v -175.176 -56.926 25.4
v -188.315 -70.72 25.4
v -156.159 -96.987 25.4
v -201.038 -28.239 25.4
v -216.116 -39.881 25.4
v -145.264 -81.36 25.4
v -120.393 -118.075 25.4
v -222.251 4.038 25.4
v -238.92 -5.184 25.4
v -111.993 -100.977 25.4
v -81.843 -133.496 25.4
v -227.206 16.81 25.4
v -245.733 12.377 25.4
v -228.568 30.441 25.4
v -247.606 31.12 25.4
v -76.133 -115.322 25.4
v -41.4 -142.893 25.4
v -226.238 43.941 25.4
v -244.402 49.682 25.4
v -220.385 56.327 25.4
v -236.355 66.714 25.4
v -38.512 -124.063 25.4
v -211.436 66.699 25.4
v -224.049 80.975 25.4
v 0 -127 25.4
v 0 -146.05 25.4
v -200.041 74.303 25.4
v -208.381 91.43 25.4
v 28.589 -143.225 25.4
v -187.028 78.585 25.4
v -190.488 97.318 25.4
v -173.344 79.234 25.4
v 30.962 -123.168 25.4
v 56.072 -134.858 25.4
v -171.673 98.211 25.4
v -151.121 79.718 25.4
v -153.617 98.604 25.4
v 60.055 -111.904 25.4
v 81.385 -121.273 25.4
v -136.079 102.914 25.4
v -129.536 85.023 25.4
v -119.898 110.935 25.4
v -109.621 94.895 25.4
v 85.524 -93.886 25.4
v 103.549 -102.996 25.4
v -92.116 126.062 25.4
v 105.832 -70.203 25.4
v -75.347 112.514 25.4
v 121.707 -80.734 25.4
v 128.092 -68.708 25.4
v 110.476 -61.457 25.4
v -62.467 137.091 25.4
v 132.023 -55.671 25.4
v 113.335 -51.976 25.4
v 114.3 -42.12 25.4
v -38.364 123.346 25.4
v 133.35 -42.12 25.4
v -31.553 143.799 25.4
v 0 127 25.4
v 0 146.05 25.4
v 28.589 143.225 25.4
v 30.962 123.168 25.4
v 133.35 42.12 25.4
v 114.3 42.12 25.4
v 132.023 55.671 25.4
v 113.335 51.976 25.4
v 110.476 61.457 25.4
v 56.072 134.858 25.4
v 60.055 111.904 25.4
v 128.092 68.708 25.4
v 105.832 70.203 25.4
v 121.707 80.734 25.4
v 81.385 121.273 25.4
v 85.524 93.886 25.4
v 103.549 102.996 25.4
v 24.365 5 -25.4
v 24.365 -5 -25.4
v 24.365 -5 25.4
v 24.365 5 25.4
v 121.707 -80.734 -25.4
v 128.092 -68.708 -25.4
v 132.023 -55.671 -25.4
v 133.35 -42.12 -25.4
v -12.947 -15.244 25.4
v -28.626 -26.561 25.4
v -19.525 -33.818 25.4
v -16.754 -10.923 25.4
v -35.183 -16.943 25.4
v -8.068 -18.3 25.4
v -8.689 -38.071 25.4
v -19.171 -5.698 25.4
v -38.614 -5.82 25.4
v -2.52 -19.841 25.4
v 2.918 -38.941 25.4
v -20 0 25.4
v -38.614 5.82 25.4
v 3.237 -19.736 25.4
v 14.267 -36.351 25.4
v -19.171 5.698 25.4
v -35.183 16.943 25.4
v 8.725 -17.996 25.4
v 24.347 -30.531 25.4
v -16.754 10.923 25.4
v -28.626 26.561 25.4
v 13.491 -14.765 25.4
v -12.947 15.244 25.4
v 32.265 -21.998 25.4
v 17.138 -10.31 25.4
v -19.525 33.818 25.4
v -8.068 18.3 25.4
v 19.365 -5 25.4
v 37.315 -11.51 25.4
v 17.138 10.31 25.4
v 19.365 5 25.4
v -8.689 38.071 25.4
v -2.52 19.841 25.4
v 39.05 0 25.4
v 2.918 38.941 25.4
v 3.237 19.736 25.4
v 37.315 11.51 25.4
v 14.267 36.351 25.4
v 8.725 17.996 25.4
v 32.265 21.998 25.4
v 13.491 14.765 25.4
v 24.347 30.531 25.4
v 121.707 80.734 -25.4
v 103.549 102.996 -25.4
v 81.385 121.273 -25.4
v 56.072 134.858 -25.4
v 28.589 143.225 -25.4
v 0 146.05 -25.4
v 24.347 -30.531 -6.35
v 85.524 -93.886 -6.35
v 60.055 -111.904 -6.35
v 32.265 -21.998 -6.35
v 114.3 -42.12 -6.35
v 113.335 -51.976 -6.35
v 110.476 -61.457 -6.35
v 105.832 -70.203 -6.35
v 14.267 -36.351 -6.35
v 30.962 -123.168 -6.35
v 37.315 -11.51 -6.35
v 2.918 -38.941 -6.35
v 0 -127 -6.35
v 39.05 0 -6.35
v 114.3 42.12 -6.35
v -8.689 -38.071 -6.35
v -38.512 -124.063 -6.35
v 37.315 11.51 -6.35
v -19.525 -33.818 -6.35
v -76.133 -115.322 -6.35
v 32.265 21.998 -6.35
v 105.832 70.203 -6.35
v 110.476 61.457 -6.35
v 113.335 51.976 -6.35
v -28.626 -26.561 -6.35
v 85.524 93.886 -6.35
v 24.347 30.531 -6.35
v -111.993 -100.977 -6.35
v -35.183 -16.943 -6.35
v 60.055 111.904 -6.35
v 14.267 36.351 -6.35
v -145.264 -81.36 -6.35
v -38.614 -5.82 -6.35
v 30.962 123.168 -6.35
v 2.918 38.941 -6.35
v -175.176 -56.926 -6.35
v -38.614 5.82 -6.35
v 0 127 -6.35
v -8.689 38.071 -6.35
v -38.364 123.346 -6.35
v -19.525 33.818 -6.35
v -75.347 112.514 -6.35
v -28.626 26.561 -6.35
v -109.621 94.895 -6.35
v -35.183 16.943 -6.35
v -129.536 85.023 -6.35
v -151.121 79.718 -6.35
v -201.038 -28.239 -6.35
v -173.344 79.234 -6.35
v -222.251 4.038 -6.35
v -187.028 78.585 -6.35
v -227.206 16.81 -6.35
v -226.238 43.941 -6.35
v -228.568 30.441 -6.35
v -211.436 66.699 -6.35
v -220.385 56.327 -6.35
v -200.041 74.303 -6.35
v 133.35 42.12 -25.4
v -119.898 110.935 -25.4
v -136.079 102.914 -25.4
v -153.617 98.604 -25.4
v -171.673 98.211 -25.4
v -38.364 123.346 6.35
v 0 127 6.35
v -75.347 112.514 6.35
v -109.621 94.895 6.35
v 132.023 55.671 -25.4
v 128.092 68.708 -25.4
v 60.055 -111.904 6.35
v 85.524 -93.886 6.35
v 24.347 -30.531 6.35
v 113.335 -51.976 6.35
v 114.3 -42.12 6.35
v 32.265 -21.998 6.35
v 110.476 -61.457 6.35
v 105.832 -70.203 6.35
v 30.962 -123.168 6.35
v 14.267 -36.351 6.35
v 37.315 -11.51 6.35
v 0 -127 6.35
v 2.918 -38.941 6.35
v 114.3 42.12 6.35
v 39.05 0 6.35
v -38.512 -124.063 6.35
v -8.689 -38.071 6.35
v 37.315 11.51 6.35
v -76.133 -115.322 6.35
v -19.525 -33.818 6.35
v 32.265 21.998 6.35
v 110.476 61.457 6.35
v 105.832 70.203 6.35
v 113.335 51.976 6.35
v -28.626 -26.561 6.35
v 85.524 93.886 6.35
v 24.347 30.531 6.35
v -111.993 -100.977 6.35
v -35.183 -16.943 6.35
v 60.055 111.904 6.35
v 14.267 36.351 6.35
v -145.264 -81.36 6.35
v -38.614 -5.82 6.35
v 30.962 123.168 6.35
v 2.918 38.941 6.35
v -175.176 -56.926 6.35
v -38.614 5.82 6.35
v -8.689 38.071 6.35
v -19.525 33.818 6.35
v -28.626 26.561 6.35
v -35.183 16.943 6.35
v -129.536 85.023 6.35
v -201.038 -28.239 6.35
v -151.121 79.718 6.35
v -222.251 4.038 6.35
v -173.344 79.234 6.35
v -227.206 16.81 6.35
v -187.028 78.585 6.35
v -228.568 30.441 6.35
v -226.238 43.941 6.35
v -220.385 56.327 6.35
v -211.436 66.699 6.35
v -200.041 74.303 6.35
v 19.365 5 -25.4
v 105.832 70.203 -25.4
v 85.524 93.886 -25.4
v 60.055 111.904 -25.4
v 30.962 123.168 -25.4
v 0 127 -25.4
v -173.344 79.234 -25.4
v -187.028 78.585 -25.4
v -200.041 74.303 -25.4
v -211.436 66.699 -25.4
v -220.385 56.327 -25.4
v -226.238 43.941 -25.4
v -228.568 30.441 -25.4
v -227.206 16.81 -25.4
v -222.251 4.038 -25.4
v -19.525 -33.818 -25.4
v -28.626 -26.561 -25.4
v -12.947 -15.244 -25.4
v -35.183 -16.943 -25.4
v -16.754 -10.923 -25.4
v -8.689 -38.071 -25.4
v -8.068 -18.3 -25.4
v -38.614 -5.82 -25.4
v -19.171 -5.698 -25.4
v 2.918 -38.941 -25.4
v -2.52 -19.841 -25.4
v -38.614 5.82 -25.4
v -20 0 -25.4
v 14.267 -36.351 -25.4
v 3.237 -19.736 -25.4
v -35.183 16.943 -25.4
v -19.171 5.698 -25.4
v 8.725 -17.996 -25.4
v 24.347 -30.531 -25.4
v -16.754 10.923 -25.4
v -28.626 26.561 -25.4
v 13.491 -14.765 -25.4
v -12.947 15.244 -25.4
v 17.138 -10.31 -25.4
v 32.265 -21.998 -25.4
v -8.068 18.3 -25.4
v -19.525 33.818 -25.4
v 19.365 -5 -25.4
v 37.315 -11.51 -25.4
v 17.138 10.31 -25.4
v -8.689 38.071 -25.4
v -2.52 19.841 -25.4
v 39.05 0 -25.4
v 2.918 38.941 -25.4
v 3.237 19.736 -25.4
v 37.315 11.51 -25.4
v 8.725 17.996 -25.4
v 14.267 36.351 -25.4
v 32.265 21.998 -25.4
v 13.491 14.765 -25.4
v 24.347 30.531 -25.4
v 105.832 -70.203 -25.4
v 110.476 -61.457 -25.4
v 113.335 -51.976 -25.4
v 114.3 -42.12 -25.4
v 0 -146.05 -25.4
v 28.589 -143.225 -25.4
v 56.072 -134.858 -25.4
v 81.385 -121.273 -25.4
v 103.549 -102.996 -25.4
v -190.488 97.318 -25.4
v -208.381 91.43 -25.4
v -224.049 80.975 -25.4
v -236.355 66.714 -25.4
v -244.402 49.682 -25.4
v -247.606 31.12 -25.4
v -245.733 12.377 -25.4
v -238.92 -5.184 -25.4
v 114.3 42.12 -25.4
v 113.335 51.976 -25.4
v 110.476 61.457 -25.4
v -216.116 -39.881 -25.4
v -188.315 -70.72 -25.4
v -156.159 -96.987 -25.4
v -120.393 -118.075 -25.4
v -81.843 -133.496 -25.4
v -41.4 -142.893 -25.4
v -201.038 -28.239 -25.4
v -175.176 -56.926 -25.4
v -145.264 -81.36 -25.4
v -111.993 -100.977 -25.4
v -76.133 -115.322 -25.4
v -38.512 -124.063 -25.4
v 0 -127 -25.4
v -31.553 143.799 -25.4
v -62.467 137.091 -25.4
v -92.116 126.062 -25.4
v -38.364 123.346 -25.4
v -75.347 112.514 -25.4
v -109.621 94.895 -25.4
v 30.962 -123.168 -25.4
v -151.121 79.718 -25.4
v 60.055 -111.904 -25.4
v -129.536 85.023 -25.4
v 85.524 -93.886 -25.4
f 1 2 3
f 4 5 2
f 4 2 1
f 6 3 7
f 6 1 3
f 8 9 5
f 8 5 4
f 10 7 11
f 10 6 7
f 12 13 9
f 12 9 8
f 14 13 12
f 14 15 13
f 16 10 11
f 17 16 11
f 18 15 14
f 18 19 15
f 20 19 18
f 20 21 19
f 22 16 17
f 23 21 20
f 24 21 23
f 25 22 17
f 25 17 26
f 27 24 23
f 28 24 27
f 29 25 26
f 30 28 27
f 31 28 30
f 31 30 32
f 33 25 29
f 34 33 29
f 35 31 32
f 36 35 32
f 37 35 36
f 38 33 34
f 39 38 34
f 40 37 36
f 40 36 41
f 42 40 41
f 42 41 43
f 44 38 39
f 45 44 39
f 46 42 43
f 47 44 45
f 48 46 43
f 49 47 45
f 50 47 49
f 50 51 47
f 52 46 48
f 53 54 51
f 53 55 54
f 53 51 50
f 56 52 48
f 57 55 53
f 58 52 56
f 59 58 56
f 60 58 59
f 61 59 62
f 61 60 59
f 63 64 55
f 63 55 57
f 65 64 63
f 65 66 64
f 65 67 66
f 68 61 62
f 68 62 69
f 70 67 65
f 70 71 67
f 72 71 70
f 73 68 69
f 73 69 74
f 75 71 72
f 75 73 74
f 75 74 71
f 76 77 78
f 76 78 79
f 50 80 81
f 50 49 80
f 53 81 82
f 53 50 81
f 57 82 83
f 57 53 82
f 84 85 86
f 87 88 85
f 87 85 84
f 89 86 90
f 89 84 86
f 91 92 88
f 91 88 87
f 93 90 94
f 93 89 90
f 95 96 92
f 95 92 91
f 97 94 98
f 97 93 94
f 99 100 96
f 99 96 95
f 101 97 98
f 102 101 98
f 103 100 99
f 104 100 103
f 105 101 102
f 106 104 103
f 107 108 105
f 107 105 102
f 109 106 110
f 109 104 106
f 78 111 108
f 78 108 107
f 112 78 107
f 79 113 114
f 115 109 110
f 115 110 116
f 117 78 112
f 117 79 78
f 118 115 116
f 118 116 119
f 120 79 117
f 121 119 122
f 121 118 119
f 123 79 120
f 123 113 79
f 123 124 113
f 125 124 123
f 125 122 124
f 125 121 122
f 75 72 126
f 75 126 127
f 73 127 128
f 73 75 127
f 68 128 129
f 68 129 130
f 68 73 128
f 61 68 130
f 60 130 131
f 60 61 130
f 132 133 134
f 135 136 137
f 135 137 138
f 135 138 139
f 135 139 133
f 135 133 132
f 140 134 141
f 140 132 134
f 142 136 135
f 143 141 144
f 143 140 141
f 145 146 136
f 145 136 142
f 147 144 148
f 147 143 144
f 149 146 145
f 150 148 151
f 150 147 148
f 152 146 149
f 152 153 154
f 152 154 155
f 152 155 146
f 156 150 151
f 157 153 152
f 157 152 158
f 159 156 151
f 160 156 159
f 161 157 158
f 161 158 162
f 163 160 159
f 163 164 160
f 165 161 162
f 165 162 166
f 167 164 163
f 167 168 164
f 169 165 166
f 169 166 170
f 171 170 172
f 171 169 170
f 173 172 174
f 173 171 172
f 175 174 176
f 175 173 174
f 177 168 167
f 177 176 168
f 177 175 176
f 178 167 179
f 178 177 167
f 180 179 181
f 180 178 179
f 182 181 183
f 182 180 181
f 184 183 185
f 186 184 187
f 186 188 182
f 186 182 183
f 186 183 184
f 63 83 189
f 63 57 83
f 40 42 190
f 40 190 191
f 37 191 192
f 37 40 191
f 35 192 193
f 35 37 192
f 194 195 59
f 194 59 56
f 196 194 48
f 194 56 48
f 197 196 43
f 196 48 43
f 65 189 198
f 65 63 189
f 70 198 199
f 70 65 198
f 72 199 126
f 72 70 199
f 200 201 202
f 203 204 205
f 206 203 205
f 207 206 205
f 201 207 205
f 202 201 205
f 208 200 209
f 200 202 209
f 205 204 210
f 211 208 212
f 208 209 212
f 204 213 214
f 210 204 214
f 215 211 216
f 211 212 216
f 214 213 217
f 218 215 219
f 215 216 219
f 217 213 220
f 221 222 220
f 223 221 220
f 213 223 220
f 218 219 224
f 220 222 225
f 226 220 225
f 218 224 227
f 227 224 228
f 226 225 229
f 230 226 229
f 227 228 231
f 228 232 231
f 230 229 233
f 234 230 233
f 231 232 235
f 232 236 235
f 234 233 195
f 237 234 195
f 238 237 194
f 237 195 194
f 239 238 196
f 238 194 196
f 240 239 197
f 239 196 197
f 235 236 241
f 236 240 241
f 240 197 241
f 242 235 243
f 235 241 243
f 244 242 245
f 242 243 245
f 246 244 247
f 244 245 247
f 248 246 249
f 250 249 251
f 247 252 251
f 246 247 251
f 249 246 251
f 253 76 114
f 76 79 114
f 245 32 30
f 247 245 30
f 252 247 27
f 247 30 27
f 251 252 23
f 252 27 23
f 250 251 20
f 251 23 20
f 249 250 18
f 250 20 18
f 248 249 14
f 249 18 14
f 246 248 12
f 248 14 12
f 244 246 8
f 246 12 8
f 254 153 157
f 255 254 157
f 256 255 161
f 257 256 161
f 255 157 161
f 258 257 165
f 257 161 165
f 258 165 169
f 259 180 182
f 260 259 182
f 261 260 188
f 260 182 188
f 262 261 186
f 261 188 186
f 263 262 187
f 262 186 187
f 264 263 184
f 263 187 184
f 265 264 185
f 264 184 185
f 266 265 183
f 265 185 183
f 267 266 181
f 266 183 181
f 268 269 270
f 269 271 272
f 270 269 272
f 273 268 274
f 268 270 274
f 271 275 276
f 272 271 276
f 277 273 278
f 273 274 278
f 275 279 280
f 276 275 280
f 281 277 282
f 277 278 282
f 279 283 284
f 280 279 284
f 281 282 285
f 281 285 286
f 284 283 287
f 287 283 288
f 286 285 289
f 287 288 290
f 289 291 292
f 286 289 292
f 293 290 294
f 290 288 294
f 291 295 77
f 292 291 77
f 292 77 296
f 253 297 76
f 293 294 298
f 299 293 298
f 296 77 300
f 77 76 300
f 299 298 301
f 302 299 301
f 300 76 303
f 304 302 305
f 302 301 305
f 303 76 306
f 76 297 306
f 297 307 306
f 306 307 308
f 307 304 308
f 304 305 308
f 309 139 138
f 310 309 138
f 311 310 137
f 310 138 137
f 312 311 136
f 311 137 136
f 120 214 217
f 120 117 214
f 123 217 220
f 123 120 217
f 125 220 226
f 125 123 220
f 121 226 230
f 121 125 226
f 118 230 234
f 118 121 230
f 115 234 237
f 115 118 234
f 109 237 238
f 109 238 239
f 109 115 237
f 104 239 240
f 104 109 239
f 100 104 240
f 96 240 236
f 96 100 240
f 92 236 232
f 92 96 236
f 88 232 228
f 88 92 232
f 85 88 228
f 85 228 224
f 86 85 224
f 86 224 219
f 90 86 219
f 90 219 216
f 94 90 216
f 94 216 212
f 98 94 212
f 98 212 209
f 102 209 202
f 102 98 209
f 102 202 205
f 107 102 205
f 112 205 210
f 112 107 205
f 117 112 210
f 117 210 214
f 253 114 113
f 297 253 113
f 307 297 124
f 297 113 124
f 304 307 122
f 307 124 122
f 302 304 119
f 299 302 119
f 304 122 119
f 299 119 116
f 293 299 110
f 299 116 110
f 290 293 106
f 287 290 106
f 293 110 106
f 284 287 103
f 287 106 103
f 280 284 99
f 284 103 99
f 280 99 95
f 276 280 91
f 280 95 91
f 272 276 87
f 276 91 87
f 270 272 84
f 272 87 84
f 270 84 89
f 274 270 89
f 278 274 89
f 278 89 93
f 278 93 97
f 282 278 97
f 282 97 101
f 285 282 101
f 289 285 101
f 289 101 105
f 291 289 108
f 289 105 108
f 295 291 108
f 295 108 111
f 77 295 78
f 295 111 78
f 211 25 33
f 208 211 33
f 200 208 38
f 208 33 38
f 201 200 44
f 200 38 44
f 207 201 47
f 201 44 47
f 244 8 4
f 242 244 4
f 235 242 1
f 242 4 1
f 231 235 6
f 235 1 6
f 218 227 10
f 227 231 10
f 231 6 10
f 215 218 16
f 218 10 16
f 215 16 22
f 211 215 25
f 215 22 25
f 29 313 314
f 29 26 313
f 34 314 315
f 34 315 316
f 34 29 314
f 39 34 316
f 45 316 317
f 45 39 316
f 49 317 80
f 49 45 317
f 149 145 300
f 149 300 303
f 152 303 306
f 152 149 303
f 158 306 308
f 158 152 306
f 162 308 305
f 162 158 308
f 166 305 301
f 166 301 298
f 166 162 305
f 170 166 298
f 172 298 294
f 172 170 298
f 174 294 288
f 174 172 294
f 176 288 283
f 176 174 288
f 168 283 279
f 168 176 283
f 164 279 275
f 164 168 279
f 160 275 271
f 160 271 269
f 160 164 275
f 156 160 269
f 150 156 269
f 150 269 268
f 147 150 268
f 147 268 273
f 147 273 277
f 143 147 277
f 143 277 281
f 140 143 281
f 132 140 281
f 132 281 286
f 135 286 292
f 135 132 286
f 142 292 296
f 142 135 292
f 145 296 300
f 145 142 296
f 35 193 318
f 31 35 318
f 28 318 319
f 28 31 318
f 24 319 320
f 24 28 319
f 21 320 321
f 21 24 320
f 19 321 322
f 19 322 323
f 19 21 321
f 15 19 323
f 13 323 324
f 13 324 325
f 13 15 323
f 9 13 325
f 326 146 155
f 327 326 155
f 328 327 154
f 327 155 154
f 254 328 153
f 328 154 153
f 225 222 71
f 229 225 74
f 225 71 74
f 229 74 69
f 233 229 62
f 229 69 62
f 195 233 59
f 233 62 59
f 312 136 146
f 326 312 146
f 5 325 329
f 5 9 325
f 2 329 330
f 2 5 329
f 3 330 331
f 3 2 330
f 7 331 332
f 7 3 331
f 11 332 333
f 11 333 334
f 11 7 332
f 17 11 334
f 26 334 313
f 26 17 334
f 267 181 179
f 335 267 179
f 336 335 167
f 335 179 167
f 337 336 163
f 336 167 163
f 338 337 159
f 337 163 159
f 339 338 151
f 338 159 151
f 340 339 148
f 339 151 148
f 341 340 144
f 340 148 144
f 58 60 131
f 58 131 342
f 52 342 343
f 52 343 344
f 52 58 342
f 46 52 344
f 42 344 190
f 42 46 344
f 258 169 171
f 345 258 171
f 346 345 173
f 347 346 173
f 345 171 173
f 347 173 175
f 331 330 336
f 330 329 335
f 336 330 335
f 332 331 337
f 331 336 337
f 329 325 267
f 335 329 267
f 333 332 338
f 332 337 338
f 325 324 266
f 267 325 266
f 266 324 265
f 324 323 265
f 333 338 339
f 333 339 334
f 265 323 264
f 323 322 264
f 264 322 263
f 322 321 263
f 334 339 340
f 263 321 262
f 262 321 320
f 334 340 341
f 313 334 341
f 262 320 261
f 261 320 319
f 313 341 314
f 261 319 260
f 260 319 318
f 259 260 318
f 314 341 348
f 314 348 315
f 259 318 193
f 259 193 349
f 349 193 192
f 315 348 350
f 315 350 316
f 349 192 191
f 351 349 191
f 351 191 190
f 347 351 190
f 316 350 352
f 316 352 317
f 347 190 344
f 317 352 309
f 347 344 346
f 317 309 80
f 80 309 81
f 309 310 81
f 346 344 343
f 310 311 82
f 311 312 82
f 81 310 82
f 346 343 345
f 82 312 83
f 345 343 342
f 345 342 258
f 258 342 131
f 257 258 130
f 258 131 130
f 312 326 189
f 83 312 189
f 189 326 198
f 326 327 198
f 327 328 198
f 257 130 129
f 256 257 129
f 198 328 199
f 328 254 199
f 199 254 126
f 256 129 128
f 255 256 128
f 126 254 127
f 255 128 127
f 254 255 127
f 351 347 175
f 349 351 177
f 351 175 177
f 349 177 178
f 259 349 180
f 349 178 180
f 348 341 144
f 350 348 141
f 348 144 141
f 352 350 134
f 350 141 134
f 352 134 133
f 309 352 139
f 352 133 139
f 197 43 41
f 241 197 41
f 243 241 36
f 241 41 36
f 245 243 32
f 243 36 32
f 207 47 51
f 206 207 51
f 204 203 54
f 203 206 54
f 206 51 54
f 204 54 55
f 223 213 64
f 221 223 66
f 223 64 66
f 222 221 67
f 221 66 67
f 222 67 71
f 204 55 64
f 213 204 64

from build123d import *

# Parameters (mm, degrees)
BOSS_EXTRUDE1_DEPTH   = 25.4
SKETCH1_R             = 39.05
BOSS_EXTRUDE1_2_DEPTH = 25.4
SKETCH1_3_R           = 39.05
BOSS_EXTRUDE2_DEPTH   = 6.35


with BuildPart() as part:
    # Sketch1 → Boss-Extrude1 (new, symmetric)
    with BuildSketch(Plane.XY):
        with BuildLine():
            Line((133.35, -42.12), (133.35, 42.12))
            ThreePointArc((133.35, 42.12), (130.375973078, 62.28554269), (121.707130955, 80.733987729))
            ThreePointArc((121.707130955, 80.733987729), (69.063027707, 128.689163118), (0, 146.05))
            ThreePointArc((0, 146.05), (-62.467080094, 137.090708669), (-119.897842805, 110.935164495))
            ThreePointArc((-119.897842805, 110.935164495), (-144.729719838, 100.277998184), (-171.672691668, 98.210734349))
            ThreePointArc((-171.672691668, 98.210734349), (-236.354801658, 66.713562108), (-238.919816081, -5.184058944))
            ThreePointArc((-238.919816081, -5.184058944), (-138.677586388, -108.211737191), (0, -146.05))
            ThreePointArc((0, -146.05), (69.063027707, -128.689163118), (121.707130955, -80.733987729))
            ThreePointArc((121.707130955, -80.733987729), (130.375973078, -62.28554269), (133.35, -42.12))
        make_face()
        with BuildLine():
            ThreePointArc((105.832287787, 70.20346759), (112.137027627, 56.786145557), (114.3, 42.12))
            Line((114.3, 42.12), (114.3, -42.12))
            ThreePointArc((114.3, -42.12), (112.137027627, -56.786145557), (105.832287787, -70.20346759))
            ThreePointArc((105.832287787, -70.20346759), (60.054806702, -111.903620102), (0, -127))
            ThreePointArc((0, -127), (-129.002280352, -91.801650259), (-222.250775331, 4.037957131))
            ThreePointArc((-222.250775331, 4.037957131), (-220.385310297, 56.327136078), (-173.343775759, 79.234170436))
            ThreePointArc((-173.343775759, 79.234170436), (-140.183195045, 81.778495155), (-109.62088485, 94.895007539))
            ThreePointArc((-109.62088485, 94.895007539), (-57.112758943, 118.808647926), (0, 127))
            ThreePointArc((0, 127), (60.054806702, 111.903620102), (105.832287787, 70.20346759))
        make_face(mode=Mode.SUBTRACT)
    extrude(amount=BOSS_EXTRUDE1_DEPTH, both=True)



with BuildPart() as body_2:
    # Sketch1 → Boss-Extrude1 2 (new, symmetric)
    with BuildSketch(Plane.XY):
        Circle(SKETCH1_R)
        with BuildLine():
            ThreePointArc((19.364916731, -5), (-20, 0), (19.364916731, 5))
            Line((19.364916731, 5), (24.364916731, 5))
            Line((24.364916731, 5), (24.364916731, -5))
            Line((24.364916731, -5), (19.364916731, -5))
        make_face(mode=Mode.SUBTRACT)
    extrude(amount=BOSS_EXTRUDE1_2_DEPTH, both=True)


with BuildPart() as part_1:
    add(part.part)

    add(body_2.part)  # Boss-Extrude2 merges body 2
    # Sketch1<3> → Boss-Extrude2 (add, symmetric)
    with BuildSketch(Plane.XY):
        with BuildLine():
            Line((114.3, -42.12), (114.3, 42.12))
            ThreePointArc((114.3, 42.12), (112.137027627, 56.786145557), (105.832287787, 70.20346759))
            ThreePointArc((105.832287787, 70.20346759), (60.054806702, 111.903620102), (0, 127))
            ThreePointArc((0, 127), (-57.112758943, 118.808647926), (-109.62088485, 94.895007539))
            ThreePointArc((-109.62088485, 94.895007539), (-140.183195045, 81.778495155), (-173.343775759, 79.234170436))
            ThreePointArc((-173.343775759, 79.234170436), (-220.385310297, 56.327136078), (-222.250775331, 4.037957131))
            ThreePointArc((-222.250775331, 4.037957131), (-129.002280352, -91.801650259), (0, -127))
            ThreePointArc((0, -127), (60.054806702, -111.903620102), (105.832287787, -70.20346759))
            ThreePointArc((105.832287787, -70.20346759), (112.137027627, -56.786145557), (114.3, -42.12))
        make_face()
        Circle(SKETCH1_3_R, mode=Mode.SUBTRACT)
    extrude(amount=BOSS_EXTRUDE2_DEPTH, both=True)


solid = part_1.part
